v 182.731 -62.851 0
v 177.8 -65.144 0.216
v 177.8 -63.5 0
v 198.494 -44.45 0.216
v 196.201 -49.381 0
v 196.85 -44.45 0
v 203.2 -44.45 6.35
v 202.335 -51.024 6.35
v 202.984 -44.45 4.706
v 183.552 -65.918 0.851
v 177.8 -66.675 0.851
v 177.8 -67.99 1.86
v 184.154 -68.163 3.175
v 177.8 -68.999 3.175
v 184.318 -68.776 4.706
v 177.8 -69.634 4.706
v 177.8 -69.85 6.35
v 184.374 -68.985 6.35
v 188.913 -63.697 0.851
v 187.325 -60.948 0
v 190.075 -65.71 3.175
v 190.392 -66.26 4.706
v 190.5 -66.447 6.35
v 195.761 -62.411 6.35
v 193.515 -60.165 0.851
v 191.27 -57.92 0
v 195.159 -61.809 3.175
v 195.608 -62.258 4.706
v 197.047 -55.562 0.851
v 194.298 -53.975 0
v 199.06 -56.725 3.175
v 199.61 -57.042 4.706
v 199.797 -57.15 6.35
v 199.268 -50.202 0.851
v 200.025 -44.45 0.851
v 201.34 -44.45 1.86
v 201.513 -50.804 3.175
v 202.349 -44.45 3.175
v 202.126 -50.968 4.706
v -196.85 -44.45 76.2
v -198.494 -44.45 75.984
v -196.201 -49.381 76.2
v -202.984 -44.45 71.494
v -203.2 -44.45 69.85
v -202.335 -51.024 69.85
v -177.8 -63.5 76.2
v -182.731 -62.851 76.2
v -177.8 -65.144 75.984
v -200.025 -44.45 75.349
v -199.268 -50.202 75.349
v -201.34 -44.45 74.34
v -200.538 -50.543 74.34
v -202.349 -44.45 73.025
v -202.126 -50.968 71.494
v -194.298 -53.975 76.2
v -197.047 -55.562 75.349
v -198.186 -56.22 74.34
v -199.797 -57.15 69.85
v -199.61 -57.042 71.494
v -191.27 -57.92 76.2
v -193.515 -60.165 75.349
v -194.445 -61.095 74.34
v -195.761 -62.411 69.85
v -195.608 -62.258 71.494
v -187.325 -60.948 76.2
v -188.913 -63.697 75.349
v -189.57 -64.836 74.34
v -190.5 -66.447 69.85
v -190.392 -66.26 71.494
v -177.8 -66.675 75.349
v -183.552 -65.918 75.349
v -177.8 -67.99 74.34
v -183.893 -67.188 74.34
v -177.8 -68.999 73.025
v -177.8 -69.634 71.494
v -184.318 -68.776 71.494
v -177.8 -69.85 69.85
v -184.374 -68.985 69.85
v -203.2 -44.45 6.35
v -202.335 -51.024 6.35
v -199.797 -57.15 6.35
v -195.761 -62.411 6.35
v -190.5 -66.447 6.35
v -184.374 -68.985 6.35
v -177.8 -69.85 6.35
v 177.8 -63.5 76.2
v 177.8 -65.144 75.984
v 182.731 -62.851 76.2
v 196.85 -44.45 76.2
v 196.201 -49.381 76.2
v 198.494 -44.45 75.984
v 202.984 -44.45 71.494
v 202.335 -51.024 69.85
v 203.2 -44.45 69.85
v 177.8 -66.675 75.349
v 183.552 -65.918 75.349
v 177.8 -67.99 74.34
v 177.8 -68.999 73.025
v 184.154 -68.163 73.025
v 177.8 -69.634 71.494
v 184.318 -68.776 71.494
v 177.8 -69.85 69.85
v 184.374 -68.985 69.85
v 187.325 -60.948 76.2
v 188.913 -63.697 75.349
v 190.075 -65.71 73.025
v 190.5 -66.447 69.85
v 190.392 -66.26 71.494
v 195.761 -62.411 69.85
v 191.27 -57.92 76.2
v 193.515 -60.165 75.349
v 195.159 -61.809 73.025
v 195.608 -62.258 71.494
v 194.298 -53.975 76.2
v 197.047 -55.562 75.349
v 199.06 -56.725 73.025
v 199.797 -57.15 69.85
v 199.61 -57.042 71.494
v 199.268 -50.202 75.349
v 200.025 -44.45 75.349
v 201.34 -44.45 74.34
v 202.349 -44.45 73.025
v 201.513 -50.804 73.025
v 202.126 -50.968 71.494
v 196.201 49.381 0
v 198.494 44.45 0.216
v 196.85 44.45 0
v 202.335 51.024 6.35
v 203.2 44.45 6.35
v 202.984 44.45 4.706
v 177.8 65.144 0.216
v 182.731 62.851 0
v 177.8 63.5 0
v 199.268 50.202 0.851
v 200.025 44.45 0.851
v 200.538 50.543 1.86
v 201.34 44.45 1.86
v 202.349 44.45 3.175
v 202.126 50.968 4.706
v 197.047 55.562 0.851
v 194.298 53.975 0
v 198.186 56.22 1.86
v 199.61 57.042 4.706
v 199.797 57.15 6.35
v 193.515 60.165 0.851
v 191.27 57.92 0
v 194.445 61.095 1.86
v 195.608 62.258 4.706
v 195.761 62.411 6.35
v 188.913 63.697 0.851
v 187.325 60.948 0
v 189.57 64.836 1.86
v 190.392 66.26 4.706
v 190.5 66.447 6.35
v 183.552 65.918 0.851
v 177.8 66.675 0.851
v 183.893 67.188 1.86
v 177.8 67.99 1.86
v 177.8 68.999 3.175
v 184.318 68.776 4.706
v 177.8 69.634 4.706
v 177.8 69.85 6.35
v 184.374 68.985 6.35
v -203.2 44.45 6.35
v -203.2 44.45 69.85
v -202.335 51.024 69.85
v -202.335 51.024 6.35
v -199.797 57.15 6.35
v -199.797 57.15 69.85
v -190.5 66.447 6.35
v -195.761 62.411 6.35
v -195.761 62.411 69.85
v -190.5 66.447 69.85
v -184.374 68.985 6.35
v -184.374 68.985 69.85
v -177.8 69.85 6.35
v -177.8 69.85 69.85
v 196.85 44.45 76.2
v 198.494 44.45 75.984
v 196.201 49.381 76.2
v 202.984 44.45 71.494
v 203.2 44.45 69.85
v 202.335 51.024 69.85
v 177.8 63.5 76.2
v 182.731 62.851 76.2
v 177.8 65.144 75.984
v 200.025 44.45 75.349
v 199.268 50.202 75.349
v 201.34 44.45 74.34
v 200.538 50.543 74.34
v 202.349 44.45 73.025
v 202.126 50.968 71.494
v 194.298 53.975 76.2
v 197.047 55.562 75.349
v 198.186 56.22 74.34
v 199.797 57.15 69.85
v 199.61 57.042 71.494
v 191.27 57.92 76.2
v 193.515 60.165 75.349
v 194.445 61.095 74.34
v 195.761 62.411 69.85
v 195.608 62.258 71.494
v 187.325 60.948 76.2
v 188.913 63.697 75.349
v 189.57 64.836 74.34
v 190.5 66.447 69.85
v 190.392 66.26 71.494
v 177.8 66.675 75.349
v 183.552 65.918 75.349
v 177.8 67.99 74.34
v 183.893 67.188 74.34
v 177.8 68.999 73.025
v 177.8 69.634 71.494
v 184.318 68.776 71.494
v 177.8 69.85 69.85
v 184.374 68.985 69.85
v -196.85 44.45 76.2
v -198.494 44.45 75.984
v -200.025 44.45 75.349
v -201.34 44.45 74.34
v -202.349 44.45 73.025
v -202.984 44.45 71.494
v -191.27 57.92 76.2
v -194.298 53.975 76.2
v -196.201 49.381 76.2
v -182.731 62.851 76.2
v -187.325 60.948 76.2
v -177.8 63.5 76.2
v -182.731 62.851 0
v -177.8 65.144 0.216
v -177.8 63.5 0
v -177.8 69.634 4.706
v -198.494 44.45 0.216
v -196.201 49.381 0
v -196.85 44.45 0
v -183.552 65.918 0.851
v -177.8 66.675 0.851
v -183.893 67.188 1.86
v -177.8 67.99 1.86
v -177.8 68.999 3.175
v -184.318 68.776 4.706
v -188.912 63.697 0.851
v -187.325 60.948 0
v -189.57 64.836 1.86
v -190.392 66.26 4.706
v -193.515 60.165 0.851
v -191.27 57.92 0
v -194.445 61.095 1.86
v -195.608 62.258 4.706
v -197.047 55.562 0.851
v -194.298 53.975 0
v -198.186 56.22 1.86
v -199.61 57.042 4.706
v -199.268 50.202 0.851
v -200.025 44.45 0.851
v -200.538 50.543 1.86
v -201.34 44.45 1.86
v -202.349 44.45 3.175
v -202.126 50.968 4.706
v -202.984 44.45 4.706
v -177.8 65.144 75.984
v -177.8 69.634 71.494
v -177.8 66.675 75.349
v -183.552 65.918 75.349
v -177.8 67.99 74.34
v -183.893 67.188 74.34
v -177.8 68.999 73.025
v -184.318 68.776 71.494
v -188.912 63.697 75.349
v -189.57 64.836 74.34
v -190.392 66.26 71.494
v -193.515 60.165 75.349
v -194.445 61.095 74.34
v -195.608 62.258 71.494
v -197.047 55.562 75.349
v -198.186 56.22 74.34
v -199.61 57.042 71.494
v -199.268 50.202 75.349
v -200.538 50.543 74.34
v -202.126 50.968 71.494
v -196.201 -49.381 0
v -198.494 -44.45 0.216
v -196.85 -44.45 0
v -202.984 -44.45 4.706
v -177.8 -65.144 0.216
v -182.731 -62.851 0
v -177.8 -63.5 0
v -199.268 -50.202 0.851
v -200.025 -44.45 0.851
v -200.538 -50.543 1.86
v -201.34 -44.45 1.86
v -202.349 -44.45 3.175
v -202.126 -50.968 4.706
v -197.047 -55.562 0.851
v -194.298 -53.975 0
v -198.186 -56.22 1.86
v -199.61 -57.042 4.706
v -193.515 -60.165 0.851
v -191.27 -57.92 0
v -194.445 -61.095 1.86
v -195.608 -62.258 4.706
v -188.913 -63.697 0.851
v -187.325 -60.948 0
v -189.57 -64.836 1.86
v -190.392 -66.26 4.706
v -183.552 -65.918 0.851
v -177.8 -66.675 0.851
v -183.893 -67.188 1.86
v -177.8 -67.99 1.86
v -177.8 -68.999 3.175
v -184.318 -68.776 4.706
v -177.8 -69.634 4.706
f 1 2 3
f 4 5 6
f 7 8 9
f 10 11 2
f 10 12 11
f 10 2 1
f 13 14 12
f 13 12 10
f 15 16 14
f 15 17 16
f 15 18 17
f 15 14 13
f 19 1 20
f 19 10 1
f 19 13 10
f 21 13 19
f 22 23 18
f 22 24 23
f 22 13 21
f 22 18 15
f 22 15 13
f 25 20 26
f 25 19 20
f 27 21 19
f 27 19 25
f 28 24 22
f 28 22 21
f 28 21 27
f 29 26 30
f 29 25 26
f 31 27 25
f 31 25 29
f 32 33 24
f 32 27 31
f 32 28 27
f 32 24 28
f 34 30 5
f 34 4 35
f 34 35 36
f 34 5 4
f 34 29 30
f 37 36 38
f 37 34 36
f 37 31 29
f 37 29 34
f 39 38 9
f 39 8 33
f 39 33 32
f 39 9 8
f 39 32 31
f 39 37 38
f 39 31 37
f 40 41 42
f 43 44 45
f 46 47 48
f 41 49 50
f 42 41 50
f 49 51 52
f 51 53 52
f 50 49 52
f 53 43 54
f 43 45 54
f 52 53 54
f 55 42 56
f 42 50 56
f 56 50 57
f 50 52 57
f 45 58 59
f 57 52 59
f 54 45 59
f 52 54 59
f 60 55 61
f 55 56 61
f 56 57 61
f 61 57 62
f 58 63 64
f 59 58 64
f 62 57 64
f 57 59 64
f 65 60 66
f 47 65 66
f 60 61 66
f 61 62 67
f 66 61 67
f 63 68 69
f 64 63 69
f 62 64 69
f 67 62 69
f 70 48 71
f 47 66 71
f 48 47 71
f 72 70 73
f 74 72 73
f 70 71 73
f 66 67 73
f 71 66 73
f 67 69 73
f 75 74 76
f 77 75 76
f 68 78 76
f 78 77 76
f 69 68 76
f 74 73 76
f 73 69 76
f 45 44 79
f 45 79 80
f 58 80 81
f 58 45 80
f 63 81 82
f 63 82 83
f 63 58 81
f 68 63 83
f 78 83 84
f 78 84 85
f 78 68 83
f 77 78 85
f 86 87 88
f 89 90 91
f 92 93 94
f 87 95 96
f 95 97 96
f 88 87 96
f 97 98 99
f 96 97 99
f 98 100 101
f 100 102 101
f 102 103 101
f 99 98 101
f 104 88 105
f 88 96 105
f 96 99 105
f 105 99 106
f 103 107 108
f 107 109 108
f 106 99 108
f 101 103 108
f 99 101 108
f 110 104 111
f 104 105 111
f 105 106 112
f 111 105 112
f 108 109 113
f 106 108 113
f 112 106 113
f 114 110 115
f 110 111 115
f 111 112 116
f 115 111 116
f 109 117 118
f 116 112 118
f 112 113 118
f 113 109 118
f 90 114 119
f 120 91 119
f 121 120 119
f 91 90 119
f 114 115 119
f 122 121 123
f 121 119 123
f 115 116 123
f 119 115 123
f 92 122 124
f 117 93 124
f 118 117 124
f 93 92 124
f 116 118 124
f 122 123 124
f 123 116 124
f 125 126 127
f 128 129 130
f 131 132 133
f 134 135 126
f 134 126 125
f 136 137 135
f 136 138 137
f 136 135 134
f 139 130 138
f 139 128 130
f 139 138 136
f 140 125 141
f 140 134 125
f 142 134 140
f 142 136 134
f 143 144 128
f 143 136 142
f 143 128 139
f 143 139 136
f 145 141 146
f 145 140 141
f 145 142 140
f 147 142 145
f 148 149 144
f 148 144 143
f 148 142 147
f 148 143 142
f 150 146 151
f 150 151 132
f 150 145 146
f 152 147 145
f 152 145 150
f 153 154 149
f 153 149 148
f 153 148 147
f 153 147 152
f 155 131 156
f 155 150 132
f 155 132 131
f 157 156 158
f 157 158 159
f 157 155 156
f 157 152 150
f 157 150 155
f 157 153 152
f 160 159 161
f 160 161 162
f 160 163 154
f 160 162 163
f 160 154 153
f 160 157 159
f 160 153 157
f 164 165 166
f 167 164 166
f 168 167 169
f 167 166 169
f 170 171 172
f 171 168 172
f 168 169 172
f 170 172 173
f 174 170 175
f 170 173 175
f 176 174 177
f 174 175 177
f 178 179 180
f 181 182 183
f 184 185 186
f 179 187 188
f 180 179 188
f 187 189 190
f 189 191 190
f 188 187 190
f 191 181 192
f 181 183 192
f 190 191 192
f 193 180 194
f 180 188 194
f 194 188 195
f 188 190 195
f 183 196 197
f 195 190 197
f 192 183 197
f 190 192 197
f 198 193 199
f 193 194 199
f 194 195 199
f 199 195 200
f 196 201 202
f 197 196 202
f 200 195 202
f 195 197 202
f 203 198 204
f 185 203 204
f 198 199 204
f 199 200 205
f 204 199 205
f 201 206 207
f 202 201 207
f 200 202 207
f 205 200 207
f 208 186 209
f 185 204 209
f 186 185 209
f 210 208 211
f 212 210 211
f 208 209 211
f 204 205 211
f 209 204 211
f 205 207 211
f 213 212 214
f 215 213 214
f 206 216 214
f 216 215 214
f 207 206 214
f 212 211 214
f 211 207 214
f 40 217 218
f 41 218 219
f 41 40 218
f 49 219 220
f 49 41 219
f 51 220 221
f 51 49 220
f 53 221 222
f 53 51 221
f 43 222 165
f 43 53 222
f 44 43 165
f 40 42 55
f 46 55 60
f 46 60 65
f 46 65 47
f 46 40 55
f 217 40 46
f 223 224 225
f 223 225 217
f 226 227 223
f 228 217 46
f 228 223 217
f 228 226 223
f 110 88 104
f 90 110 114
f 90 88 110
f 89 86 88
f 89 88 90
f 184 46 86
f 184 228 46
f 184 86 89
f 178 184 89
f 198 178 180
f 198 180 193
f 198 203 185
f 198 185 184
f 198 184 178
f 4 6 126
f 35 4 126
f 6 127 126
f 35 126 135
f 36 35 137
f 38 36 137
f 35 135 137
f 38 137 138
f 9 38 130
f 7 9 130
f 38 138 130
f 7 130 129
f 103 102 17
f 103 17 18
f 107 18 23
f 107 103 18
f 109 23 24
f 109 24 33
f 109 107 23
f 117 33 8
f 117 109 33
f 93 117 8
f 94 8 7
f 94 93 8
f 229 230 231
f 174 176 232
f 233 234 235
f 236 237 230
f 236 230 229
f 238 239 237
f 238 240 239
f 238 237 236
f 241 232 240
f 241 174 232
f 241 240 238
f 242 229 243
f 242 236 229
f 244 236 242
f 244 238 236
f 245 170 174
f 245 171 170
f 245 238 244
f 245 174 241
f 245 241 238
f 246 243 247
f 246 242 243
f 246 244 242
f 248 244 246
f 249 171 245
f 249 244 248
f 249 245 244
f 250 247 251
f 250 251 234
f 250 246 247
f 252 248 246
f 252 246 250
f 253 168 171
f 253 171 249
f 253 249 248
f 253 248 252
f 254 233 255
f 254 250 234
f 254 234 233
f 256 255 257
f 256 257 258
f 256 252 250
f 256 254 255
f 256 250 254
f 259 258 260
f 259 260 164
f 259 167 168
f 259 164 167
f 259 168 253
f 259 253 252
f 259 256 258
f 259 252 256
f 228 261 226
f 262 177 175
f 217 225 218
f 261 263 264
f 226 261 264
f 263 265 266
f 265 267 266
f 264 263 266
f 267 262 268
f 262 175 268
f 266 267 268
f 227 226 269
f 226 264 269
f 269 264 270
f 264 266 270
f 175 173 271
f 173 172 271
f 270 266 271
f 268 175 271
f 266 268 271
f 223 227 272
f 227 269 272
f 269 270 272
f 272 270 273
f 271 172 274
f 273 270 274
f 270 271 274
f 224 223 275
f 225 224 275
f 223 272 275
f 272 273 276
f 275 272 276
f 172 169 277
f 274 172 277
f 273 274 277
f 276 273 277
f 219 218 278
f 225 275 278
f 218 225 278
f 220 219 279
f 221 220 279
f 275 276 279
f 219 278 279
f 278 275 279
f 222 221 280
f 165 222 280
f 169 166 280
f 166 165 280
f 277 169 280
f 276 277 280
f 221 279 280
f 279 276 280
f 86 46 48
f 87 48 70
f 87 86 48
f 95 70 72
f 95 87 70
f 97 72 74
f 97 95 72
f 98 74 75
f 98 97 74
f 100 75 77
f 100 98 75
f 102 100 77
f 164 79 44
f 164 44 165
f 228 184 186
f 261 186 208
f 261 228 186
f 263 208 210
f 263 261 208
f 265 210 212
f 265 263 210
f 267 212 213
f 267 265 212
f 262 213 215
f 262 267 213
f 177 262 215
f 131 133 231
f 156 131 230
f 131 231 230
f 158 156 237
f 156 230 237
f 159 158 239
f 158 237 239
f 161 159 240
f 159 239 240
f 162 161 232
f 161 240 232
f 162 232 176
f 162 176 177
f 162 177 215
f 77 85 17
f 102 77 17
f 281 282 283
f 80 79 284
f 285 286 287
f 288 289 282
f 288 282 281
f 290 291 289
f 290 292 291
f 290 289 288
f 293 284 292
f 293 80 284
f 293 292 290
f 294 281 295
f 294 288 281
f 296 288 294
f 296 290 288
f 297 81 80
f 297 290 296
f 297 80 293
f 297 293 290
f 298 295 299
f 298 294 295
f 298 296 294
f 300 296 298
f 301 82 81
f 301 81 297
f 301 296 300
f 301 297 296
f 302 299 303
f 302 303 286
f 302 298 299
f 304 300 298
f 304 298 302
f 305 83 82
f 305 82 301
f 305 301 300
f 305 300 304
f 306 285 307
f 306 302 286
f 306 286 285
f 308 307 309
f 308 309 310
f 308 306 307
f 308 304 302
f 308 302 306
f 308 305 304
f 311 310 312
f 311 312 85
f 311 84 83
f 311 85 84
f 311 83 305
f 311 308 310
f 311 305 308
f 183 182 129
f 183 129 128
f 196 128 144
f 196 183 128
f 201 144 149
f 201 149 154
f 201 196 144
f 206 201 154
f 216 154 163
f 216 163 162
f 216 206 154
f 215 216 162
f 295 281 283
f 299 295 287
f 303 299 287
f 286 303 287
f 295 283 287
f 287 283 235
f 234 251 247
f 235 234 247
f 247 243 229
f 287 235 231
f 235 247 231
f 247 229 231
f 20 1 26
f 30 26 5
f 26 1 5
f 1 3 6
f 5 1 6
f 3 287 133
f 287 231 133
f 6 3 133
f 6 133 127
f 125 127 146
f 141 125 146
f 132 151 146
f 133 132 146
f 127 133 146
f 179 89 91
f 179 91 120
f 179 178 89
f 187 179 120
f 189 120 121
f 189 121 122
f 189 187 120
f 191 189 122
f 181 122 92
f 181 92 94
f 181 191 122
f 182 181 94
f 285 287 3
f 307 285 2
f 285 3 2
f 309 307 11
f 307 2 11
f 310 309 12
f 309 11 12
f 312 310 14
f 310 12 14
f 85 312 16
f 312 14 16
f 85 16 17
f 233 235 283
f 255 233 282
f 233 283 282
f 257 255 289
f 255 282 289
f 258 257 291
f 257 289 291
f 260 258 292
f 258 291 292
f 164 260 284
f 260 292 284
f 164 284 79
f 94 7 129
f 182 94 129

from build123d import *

# Parameters (mm, degrees)
SKETCH1_W           = 406.4
SKETCH1_H           = 139.7
BOSS_EXTRUDE1_DEPTH = 76.2
FILLET1_R           = 25.4
FILLET2_R           = 6.35


with BuildPart() as part:
    # Sketch1 → Boss-Extrude1 (new body)
    with BuildSketch(Plane.XY):
        Rectangle(SKETCH1_W, SKETCH1_H)
    extrude(amount=BOSS_EXTRUDE1_DEPTH)

    # Fillet1
    fillet1_edges = [part.edges().sort_by_distance(p)[0] for p in [
        (203.2, -69.85, 38.1),
        (-203.2, -69.85, 38.1),
        (-203.2, 69.85, 38.1),
        (203.2, 69.85, 38.1),
    ]]
    fillet(fillet1_edges, radius=FILLET1_R)

    # Fillet2
    fillet2_edges = [part.edges().sort_by_distance(p)[0] for p in [
        (203.2, 0, 0),
        (203.2, 0, 76.2),
        (0, -69.85, 0),
        (-203.2, 0, 0),
        (0, 69.85, 0),
        (195.760512242, 62.410512242, 0),
        (-195.760512242, 62.410512242, 0),
        (-195.760512242, -62.410512242, 0),
        (195.760512242, -62.410512242, 0),
        (0, -69.85, 76.2),
        (0, 69.85, 76.2),
        (-203.2, 0, 76.2),
        (195.760512242, 62.410512242, 76.2),
        (-195.760512242, 62.410512242, 76.2),
        (-195.760512242, -62.410512242, 76.2),
        (195.760512242, -62.410512242, 76.2),
    ]]
    fillet(fillet2_edges, radius=FILLET2_R)


solid = part.part
